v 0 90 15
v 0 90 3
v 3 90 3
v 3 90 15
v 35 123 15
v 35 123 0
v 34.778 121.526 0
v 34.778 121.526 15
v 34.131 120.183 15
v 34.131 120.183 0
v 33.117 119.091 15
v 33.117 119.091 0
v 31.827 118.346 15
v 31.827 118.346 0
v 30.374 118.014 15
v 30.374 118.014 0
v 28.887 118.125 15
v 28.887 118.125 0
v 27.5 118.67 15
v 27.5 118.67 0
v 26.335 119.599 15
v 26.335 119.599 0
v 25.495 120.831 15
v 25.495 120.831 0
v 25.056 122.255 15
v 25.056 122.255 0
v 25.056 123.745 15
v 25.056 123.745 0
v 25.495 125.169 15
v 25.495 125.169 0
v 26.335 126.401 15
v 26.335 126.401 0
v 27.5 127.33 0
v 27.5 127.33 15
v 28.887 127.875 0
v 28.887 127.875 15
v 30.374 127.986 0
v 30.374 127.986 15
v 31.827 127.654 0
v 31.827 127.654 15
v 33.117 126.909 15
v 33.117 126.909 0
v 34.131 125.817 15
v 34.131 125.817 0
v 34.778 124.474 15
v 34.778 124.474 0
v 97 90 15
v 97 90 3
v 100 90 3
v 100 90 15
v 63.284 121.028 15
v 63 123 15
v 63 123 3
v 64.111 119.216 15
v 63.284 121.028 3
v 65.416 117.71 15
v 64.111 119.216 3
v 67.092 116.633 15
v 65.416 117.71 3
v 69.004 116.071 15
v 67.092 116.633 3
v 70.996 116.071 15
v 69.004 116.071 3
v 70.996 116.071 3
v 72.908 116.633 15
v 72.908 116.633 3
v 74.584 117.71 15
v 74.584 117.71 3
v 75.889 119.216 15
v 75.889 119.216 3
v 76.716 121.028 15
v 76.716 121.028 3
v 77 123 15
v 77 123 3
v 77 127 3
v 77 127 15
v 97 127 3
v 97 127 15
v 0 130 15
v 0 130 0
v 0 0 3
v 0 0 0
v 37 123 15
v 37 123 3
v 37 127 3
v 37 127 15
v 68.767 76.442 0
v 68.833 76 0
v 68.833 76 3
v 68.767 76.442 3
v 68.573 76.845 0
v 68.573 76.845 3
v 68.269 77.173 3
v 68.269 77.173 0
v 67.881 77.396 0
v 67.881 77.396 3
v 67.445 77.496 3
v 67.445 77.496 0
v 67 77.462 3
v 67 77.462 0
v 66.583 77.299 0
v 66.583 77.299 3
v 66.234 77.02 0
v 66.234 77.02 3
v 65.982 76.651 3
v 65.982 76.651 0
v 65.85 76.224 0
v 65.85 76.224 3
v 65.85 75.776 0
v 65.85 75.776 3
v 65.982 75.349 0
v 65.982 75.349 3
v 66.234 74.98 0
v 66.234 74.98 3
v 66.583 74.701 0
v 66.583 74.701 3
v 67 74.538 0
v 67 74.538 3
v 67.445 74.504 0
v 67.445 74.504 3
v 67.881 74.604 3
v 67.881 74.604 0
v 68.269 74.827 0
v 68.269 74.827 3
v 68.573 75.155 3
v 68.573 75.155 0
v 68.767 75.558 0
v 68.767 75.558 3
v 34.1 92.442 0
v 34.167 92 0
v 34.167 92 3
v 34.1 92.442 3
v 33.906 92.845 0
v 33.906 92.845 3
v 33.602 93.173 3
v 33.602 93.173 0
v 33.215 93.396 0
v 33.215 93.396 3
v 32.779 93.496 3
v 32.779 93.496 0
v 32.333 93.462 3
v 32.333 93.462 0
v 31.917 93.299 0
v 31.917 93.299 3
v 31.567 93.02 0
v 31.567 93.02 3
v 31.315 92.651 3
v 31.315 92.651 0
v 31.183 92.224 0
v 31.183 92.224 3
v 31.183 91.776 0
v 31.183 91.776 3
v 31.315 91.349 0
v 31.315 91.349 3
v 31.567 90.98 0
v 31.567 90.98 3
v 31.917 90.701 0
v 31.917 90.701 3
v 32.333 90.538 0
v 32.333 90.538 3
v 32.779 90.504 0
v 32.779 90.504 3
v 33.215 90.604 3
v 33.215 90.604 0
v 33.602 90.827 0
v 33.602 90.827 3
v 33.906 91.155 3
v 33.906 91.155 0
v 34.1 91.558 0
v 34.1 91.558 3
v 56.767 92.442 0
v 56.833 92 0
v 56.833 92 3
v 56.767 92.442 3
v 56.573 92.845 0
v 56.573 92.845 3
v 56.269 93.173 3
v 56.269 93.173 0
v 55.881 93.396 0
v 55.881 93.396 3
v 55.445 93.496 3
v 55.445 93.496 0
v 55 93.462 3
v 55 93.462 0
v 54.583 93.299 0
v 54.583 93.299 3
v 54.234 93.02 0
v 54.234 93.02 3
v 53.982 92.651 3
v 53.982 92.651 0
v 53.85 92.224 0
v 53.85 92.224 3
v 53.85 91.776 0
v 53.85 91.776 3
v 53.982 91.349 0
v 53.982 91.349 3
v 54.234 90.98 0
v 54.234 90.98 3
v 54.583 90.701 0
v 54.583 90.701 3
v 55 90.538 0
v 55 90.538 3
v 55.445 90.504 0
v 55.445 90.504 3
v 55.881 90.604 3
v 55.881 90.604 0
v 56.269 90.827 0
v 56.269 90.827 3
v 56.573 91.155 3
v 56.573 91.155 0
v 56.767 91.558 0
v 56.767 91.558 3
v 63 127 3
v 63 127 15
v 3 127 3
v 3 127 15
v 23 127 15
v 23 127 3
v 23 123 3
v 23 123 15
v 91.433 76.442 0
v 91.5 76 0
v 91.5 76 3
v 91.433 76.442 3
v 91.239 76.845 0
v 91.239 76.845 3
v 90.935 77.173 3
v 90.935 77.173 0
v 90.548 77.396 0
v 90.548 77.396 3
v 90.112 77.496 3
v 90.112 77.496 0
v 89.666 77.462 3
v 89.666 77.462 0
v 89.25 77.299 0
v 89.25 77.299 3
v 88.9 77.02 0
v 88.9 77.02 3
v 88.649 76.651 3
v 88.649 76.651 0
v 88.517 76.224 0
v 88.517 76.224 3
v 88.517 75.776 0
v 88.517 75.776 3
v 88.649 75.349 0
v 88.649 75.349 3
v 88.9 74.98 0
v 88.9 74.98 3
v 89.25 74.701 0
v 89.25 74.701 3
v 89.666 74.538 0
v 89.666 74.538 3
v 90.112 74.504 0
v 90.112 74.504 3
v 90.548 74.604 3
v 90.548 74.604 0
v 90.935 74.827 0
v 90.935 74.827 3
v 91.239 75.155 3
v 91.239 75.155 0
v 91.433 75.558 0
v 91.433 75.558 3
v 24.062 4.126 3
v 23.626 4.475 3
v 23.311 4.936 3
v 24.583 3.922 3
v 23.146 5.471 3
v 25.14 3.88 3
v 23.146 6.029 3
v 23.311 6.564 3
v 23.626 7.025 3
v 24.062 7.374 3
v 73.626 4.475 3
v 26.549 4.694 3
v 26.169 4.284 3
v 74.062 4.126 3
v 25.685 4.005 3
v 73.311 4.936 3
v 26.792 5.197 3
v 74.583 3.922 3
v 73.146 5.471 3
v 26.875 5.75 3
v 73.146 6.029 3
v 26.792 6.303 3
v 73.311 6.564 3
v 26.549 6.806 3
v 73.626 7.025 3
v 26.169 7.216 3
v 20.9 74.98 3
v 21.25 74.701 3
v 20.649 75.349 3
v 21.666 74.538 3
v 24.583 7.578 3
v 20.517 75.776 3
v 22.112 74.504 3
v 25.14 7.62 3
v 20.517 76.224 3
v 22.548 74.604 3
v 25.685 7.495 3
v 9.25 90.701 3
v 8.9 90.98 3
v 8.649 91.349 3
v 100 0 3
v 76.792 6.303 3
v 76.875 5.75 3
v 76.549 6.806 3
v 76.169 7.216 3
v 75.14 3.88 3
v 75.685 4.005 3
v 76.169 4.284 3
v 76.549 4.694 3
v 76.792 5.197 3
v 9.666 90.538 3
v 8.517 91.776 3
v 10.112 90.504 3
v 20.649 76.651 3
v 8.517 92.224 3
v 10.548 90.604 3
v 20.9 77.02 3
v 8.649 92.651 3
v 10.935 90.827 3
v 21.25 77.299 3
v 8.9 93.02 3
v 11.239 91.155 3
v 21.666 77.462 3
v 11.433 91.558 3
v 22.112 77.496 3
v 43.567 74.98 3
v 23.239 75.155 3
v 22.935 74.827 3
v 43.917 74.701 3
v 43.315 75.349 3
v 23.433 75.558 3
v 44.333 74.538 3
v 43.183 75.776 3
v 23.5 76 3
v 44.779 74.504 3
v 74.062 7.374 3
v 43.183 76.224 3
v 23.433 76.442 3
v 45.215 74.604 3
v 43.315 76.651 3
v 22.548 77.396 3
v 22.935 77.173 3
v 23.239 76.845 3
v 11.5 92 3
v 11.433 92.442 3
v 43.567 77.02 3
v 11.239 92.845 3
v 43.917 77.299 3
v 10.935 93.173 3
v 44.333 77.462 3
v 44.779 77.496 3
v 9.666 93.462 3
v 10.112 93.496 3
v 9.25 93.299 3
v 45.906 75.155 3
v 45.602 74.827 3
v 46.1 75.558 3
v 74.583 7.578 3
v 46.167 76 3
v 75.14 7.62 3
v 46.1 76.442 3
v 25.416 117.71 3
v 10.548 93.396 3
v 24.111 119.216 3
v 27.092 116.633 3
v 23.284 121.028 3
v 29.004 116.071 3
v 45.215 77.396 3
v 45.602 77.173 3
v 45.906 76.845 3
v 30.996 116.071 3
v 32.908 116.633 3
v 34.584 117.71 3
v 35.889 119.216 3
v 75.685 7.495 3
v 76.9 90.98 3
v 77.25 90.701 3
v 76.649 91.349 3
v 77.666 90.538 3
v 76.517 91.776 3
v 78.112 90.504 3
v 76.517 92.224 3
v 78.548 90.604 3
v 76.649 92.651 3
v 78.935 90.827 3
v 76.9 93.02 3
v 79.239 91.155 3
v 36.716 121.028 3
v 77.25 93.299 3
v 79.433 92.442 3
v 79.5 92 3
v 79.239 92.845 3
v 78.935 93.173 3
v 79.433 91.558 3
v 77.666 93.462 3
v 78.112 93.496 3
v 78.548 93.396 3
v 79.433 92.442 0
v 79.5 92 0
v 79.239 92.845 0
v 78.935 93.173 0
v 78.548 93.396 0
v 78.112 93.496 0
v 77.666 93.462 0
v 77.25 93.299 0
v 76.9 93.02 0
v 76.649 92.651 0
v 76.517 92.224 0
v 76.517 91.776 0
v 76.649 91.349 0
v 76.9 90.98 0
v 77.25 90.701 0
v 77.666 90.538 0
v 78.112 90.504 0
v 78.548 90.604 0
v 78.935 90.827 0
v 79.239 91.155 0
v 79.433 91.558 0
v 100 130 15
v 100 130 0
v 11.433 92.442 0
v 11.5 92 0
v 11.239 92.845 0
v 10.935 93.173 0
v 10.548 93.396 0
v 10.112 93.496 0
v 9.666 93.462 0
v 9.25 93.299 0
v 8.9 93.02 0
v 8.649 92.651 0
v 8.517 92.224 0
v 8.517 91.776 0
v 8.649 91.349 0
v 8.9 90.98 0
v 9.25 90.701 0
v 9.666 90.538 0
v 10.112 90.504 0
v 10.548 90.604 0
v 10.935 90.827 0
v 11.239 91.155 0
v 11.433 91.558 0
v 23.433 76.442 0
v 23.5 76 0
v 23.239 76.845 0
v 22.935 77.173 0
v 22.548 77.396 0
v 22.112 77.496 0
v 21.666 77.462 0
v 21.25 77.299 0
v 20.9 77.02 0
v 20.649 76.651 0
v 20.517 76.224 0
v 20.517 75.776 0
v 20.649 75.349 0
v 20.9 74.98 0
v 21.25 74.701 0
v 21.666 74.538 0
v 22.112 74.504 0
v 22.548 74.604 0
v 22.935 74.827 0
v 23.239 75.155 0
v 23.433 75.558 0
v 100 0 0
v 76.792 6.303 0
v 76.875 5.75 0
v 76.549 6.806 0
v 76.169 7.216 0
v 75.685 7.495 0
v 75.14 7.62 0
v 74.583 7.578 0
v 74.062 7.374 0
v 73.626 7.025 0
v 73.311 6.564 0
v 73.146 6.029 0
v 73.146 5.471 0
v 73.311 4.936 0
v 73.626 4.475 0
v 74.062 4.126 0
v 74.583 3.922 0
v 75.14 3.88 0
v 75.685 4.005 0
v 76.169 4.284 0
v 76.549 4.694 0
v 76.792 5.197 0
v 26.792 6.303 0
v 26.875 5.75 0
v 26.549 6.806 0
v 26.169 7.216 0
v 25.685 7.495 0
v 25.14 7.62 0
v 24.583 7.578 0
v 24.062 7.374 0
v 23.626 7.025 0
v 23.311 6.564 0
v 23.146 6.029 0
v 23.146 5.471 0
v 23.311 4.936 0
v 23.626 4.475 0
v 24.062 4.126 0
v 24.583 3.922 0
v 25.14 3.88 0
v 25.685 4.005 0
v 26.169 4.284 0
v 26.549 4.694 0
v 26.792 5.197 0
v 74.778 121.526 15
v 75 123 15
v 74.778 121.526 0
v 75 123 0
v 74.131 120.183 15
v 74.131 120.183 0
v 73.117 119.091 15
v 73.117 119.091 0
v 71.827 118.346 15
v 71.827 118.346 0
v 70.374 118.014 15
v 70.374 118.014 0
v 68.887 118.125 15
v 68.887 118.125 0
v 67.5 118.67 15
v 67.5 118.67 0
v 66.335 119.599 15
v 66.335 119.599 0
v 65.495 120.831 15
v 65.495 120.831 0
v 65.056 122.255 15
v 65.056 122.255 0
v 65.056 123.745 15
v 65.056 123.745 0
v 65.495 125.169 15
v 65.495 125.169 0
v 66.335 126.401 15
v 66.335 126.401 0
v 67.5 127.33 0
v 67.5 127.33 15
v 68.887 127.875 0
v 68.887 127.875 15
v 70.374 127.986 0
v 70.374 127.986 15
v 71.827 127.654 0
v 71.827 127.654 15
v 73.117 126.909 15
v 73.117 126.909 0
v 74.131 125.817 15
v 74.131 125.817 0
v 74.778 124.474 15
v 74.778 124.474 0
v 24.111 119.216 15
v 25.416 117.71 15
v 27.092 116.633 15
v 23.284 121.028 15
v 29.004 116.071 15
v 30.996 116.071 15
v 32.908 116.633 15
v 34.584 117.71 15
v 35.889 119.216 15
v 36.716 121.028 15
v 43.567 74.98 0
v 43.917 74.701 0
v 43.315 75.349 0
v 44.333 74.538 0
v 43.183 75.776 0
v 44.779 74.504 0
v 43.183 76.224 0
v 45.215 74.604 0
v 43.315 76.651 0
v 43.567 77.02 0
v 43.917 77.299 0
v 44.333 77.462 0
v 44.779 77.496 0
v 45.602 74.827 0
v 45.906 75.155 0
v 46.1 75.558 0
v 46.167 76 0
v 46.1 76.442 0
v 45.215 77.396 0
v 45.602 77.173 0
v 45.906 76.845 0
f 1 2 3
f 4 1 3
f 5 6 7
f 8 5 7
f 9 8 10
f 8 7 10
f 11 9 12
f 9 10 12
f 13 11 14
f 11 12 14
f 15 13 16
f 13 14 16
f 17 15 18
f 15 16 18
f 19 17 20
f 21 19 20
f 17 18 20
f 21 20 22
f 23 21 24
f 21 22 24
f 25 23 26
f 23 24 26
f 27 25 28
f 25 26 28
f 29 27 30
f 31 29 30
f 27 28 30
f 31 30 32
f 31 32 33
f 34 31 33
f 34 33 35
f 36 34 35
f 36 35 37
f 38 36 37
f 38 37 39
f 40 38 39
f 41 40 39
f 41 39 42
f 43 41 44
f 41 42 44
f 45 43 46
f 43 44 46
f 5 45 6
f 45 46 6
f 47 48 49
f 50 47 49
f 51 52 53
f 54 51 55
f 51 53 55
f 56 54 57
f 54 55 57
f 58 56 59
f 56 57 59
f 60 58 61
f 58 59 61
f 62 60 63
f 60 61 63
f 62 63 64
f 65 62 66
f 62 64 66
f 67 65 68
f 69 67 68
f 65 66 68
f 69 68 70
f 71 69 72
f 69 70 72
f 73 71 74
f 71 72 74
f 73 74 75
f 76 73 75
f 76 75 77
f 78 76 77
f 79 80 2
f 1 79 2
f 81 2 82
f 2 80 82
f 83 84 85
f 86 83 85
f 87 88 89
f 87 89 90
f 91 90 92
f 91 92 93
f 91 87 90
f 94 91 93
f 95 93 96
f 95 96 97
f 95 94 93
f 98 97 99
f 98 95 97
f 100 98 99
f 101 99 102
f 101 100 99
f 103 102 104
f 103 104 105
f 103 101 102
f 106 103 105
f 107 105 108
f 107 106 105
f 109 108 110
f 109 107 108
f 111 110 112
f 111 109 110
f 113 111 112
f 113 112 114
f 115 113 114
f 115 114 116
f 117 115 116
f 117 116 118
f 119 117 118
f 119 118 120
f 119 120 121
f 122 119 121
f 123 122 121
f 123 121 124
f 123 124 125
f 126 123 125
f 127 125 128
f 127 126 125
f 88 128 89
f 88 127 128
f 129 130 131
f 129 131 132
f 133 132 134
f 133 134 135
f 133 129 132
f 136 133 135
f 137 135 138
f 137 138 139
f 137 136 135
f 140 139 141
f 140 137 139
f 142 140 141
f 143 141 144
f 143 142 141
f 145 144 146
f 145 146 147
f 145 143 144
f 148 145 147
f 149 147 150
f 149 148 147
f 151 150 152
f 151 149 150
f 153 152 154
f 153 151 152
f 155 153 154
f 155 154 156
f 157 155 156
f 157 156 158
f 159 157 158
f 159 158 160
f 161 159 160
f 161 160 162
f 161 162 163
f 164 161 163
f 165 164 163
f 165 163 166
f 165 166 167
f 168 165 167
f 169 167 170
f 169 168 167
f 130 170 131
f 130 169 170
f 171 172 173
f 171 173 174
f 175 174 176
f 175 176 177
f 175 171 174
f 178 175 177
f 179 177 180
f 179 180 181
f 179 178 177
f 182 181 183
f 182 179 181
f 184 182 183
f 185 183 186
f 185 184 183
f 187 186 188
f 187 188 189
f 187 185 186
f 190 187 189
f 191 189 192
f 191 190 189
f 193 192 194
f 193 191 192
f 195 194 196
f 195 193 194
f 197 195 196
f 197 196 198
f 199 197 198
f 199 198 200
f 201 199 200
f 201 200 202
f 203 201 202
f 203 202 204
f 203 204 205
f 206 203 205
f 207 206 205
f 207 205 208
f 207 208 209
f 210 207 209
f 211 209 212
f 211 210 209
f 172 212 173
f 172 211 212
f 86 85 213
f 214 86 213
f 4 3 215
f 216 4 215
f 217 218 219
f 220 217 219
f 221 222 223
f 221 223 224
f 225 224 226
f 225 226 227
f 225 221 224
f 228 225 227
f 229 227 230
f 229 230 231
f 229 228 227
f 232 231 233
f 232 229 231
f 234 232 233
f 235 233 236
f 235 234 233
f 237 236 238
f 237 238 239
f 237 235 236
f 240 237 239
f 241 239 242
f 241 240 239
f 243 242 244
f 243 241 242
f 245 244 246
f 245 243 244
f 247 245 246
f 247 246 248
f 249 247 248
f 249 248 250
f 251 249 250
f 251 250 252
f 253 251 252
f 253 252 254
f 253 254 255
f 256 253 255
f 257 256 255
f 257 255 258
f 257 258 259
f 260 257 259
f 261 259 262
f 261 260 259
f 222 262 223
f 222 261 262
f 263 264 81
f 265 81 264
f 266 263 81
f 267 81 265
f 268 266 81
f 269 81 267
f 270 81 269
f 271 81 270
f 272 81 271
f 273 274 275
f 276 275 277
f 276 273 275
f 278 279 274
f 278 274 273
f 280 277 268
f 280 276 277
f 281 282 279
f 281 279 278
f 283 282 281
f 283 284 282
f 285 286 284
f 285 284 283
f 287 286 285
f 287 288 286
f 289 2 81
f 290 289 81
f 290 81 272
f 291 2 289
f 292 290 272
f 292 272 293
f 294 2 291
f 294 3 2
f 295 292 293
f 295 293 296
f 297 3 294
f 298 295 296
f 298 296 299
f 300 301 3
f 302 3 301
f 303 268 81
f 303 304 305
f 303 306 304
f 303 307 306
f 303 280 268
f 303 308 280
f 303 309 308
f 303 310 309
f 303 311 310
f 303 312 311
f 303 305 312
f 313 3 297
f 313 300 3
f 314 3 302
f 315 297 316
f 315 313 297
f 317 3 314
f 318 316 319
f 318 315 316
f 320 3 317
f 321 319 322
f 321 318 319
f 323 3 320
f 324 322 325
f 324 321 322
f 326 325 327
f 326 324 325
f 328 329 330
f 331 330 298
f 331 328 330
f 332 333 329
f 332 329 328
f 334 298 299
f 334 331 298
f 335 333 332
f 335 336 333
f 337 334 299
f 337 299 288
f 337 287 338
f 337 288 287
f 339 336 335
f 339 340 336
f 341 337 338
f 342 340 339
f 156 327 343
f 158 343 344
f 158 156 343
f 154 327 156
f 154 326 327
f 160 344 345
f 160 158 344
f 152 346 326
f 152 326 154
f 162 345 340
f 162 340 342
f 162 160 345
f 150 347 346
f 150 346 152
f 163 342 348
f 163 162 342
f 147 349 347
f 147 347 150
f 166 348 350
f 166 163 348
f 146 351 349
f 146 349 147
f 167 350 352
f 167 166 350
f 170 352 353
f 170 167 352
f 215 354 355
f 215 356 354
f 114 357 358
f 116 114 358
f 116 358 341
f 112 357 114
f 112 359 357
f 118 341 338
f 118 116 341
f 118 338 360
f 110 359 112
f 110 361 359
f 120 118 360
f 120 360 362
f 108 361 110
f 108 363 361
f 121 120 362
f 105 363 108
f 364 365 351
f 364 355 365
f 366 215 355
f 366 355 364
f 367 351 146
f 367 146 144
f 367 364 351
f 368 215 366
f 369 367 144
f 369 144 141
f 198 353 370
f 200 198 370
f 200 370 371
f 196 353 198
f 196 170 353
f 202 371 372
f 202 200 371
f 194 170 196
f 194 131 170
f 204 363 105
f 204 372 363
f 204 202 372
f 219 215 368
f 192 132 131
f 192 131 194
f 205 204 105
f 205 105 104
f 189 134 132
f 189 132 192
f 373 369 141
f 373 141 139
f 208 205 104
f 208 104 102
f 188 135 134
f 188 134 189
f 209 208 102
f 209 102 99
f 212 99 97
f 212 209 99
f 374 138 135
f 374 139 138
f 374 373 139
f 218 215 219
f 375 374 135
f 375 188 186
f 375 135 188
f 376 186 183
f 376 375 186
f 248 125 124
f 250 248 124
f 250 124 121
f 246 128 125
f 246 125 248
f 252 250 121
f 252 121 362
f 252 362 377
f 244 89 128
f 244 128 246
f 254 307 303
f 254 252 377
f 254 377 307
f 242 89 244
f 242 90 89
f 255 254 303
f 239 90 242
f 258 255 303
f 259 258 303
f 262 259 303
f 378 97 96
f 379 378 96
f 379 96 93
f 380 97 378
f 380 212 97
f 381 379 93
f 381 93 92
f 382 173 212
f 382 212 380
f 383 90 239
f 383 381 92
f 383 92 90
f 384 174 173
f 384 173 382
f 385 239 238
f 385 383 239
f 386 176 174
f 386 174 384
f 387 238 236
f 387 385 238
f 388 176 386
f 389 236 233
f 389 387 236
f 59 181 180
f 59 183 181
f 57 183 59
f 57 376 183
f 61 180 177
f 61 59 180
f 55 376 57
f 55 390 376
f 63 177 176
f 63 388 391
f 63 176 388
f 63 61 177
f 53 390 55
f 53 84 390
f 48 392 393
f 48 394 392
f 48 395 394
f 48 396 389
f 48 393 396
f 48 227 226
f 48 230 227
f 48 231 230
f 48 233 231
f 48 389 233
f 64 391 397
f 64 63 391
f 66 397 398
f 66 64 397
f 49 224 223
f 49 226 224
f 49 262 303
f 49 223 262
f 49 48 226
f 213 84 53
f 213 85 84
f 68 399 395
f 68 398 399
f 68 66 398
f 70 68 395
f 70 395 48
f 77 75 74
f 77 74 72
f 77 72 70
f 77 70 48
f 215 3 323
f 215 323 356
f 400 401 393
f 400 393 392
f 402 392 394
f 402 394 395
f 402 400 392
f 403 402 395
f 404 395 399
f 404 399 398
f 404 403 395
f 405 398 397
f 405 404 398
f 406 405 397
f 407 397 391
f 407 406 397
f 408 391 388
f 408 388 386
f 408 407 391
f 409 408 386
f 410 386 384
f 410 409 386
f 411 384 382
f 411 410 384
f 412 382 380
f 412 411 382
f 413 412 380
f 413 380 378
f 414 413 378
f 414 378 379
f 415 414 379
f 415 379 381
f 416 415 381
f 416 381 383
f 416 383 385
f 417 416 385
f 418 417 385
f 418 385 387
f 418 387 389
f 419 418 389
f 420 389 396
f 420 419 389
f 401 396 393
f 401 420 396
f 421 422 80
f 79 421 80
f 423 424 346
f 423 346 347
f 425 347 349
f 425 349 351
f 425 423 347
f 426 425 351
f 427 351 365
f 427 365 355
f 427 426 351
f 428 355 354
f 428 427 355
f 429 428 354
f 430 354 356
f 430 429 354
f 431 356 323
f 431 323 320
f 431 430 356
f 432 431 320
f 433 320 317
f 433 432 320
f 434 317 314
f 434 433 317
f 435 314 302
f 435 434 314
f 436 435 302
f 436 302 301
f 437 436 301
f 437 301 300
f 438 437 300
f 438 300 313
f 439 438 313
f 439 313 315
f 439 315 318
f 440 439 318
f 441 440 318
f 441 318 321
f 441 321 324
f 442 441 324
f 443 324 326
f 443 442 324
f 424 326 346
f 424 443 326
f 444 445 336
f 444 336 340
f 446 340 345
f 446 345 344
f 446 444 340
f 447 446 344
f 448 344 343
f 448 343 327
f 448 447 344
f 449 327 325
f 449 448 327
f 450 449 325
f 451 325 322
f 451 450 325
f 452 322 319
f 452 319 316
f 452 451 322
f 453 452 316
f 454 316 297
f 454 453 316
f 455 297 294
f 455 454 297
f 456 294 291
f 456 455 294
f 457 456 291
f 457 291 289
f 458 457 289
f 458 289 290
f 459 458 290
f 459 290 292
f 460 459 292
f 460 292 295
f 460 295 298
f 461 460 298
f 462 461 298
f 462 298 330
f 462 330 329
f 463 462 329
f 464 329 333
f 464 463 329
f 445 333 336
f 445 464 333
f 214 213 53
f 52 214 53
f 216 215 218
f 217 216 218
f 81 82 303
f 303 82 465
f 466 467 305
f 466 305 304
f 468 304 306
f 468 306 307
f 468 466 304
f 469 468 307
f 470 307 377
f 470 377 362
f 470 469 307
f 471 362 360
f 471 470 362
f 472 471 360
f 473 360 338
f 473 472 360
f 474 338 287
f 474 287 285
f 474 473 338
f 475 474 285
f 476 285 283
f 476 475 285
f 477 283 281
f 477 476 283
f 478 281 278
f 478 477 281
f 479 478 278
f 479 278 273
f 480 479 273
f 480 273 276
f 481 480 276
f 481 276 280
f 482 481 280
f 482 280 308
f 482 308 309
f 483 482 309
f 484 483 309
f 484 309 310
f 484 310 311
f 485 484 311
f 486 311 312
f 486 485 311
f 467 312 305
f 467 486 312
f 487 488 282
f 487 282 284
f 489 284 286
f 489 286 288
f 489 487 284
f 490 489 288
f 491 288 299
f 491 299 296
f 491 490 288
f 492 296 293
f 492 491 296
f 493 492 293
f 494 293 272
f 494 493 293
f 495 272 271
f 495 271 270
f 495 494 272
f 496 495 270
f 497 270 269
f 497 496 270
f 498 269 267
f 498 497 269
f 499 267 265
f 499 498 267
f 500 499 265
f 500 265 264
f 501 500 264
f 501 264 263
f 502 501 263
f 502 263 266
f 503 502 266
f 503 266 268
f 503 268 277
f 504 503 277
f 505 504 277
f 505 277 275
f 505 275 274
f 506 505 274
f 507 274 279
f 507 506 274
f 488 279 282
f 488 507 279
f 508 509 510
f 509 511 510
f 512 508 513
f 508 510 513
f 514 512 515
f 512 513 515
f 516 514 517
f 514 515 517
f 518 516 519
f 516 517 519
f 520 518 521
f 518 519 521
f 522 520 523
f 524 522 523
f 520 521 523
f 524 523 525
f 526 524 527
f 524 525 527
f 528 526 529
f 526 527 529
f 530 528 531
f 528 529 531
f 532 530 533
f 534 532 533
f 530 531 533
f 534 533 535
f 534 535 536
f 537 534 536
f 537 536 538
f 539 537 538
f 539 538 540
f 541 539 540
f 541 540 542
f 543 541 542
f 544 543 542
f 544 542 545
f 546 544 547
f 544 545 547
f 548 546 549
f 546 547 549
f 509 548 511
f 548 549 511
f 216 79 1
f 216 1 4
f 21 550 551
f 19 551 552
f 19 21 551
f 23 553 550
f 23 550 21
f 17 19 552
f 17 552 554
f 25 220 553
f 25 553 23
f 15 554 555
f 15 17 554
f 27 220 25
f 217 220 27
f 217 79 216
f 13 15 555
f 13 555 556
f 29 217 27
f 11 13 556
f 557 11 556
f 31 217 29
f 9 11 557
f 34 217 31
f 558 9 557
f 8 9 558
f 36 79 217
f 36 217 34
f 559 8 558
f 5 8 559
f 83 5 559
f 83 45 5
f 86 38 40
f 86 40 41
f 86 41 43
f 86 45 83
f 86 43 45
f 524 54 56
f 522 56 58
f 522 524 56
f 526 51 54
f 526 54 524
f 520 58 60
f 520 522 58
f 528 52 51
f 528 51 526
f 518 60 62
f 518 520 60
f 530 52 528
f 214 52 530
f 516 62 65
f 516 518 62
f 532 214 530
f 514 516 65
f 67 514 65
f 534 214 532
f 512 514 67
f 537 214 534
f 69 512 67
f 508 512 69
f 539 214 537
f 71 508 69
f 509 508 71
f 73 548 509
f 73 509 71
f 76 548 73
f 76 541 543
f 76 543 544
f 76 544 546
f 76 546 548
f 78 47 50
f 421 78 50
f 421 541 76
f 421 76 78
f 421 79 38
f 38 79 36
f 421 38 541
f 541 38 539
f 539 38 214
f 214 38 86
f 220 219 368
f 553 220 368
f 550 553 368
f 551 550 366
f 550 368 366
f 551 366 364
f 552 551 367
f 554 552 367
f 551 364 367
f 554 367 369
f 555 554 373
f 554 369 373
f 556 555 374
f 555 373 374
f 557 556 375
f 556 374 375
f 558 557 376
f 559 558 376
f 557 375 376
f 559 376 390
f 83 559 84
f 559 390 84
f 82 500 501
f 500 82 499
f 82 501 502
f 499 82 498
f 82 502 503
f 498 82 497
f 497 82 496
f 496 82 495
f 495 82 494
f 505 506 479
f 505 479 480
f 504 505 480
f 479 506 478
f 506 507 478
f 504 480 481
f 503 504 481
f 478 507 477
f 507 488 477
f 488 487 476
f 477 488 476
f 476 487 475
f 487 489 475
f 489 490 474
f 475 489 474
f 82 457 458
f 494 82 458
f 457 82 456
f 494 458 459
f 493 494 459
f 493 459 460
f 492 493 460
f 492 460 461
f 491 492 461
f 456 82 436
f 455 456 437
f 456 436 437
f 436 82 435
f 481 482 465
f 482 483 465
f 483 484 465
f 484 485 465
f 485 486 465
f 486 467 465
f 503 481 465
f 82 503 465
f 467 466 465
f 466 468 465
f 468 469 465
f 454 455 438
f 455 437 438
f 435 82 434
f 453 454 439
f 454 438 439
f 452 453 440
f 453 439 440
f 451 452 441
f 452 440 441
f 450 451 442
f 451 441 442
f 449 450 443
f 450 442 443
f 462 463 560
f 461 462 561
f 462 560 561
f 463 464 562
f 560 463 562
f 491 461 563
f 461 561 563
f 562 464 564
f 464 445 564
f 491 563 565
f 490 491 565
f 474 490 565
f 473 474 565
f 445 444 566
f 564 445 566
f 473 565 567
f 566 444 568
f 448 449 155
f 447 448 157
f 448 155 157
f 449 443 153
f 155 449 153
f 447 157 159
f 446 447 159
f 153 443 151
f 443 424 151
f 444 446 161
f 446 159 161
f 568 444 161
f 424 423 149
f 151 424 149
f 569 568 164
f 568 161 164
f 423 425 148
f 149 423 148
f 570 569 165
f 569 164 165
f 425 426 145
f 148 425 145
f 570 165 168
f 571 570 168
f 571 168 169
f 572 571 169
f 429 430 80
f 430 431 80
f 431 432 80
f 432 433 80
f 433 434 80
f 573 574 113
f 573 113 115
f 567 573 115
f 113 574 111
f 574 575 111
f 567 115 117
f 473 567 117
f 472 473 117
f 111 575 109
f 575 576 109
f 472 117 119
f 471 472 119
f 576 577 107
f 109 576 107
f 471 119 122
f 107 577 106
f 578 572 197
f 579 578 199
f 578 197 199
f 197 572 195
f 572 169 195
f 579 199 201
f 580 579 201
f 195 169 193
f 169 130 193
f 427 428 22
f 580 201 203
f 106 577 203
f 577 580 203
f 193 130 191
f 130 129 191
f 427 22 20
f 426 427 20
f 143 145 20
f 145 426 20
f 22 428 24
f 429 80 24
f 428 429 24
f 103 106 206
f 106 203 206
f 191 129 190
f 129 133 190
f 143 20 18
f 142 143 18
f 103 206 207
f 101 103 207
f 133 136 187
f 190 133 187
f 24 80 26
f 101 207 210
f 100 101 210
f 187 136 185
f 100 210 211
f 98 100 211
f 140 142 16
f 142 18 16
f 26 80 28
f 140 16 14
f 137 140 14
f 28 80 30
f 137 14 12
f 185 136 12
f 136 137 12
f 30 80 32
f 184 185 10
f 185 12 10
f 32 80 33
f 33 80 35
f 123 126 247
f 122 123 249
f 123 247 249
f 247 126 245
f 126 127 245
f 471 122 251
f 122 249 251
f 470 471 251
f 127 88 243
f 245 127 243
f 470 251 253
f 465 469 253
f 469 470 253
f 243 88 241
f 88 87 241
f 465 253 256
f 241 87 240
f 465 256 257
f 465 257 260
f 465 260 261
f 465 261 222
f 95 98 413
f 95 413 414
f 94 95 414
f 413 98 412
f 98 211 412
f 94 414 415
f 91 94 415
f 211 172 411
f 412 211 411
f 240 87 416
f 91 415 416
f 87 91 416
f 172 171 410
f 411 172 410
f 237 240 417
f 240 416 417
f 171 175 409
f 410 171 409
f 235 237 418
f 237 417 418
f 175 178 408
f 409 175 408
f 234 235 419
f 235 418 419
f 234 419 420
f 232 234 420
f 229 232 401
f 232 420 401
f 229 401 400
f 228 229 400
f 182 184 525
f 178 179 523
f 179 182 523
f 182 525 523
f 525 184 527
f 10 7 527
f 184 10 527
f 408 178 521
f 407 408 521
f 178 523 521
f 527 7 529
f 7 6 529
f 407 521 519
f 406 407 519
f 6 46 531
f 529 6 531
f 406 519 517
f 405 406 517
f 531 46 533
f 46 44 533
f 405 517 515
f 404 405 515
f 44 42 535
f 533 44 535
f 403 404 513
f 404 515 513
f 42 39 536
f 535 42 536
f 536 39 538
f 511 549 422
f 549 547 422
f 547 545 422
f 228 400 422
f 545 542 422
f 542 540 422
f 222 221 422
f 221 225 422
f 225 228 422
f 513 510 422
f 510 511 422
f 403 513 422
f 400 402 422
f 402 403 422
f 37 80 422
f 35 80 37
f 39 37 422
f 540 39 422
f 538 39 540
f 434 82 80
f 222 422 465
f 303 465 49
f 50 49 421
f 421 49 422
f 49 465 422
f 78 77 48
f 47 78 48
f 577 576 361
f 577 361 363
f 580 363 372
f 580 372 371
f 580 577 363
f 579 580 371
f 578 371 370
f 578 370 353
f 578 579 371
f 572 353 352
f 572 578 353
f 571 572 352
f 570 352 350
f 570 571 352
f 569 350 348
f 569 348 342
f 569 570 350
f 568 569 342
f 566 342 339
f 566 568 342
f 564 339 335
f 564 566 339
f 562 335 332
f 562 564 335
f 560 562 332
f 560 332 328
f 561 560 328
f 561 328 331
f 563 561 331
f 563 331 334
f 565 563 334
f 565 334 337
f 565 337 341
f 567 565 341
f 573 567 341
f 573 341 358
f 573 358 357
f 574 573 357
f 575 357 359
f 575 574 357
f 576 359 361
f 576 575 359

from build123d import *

# Parameters (mm, degrees)
SKETCH1_R              = 1.875
SKETCH1_R_2            = 5
BOSS_EXTRUDE1_DEPTH    = 3
CUT_EXTRUDE1_OUTLINE_R = 1.5
CUT_EXTRUDE1_DEPTH     = 3
LPATTERN1_COUNT        = 4
LPATTERN1_PITCH        = 22.666666667
SKETCH1_4_W            = 20
SKETCH1_4_H            = 3
SKETCH1_4_W_2          = 26
BOSS_EXTRUDE2_DEPTH    = 15


# Read off the part's stored shape, not the designer's step: Cut-Extrude1
with BuildPart() as part:
    # Sketch1 → Boss-Extrude1 (new body)
    with BuildSketch(Plane.XY):
        Polygon((77, 130), (63, 130), (63, 127), (37, 127), (37, 130), (23, 130), (23, 127), (3, 127), (3, 130), (0, 130), (0, 0), (100, 0), (100, 130), (97, 130), (97, 127), (77, 127), align=None)
        with Locations((25, 5.75)):
            Circle(SKETCH1_R, mode=Mode.SUBTRACT)
        with Locations((75, 5.75)):
            Circle(SKETCH1_R, mode=Mode.SUBTRACT)
        with BuildLine():
            ThreePointArc((37, 123), (30, 116), (23, 123))
            Line((23, 123), (25, 123))
            ThreePointArc((25, 123), (30, 128), (35, 123))
            Line((35, 123), (37, 123))
        make_face(mode=Mode.SUBTRACT)
        with Locations((70, 123)):
            Circle(SKETCH1_R_2, mode=Mode.SUBTRACT)
    extrude(amount=BOSS_EXTRUDE1_DEPTH)

    # Cut-Extrude1 outline → Cut-Extrude1 (cut)
    with BuildSketch(Plane.XY):
        with Locations((22, 76)):
            Circle(CUT_EXTRUDE1_OUTLINE_R)
        with Locations((10, 92)):
            Circle(CUT_EXTRUDE1_OUTLINE_R)
    cut_extrude1 = extrude(amount=CUT_EXTRUDE1_DEPTH, mode=Mode.SUBTRACT)

    # LPattern1: Cut-Extrude1 ×4
    with Locations(*[(i * LPATTERN1_PITCH, 0, 0) for i in range(1, LPATTERN1_COUNT)]):
        add(cut_extrude1, mode=Mode.SUBTRACT)

    # Sketch1<4> → Boss-Extrude2 (add)
    with BuildSketch(Plane.XY):
        Polygon((0, 130), (0, 90), (3, 90), (3, 127), (3, 130), align=None)
        with Locations((13, 128.5)):
            Rectangle(SKETCH1_4_W, SKETCH1_4_H)
        Polygon((97, 90), (100, 90), (100, 130), (97, 130), (97, 127), align=None)
        with Locations((87, 128.5)):
            Rectangle(SKETCH1_4_W, SKETCH1_4_H)
        with BuildLine():
            Line((77, 127), (77, 130))
            Line((77, 130), (70, 130))
            ThreePointArc((70, 130), (74.949747468, 127.949747468), (77, 123))
            Line((77, 123), (77, 127))
        make_face()
        with BuildLine():
            ThreePointArc((63, 123), (65.050252532, 127.949747468), (70, 130))
            Line((70, 130), (63, 130))
            Line((63, 130), (63, 127))
            Line((63, 127), (63, 123))
        make_face()
        with BuildLine():
            ThreePointArc((77, 123), (74.949747468, 127.949747468), (70, 130))
            ThreePointArc((70, 130), (65.050252532, 127.949747468), (63, 123))
            Line((63, 123), (65, 123))
            ThreePointArc((65, 123), (70, 128), (75, 123))
            Line((75, 123), (77, 123))
        make_face()
        with BuildLine():
            ThreePointArc((63, 123), (70, 116), (77, 123))
            Line((77, 123), (75, 123))
            ThreePointArc((75, 123), (70, 118), (65, 123))
            Line((65, 123), (63, 123))
        make_face()
        with BuildLine():
            ThreePointArc((77, 123), (74.949747468, 127.949747468), (70, 130))
            ThreePointArc((70, 130), (65.050252532, 127.949747468), (63, 123))
            Line((63, 123), (65, 123))
            ThreePointArc((65, 123), (70, 128), (75, 123))
            Line((75, 123), (77, 123))
        make_face()
        with BuildLine():
            ThreePointArc((63, 123), (70, 116), (77, 123))
            Line((77, 123), (75, 123))
            ThreePointArc((75, 123), (70, 118), (65, 123))
            Line((65, 123), (63, 123))
        make_face()
        with Locations((50, 128.5)):
            Rectangle(SKETCH1_4_W_2, SKETCH1_4_H)
        with BuildLine():
            Line((37, 130), (30, 130))
            ThreePointArc((30, 130), (34.949747468, 127.949747468), (37, 123))
            Line((37, 123), (37, 127))
            Line((37, 127), (37, 130))
        make_face()
        with BuildLine():
            Line((30, 130), (23, 130))
            Line((23, 130), (23, 127))
            Line((23, 127), (23, 123))
            ThreePointArc((23, 123), (25.050252532, 127.949747468), (30, 130))
        make_face()
        with BuildLine():
            ThreePointArc((37, 123), (34.949747468, 127.949747468), (30, 130))
            ThreePointArc((30, 130), (25.050252532, 127.949747468), (23, 123))
            Line((23, 123), (25, 123))
            ThreePointArc((25, 123), (30, 128), (35, 123))
            Line((35, 123), (37, 123))
        make_face()
        with BuildLine():
            Line((25, 123), (23, 123))
            ThreePointArc((23, 123), (30, 116), (37, 123))
            Line((37, 123), (35, 123))
            ThreePointArc((35, 123), (30, 118), (25, 123))
        make_face()
        with BuildLine():
            ThreePointArc((37, 123), (34.949747468, 127.949747468), (30, 130))
            ThreePointArc((30, 130), (25.050252532, 127.949747468), (23, 123))
            Line((23, 123), (25, 123))
            ThreePointArc((25, 123), (30, 128), (35, 123))
            Line((35, 123), (37, 123))
        make_face()
        with BuildLine():
            Line((25, 123), (23, 123))
            ThreePointArc((23, 123), (30, 116), (37, 123))
            Line((37, 123), (35, 123))
            ThreePointArc((35, 123), (30, 118), (25, 123))
        make_face()
    extrude(amount=BOSS_EXTRUDE2_DEPTH)


solid = part.part
